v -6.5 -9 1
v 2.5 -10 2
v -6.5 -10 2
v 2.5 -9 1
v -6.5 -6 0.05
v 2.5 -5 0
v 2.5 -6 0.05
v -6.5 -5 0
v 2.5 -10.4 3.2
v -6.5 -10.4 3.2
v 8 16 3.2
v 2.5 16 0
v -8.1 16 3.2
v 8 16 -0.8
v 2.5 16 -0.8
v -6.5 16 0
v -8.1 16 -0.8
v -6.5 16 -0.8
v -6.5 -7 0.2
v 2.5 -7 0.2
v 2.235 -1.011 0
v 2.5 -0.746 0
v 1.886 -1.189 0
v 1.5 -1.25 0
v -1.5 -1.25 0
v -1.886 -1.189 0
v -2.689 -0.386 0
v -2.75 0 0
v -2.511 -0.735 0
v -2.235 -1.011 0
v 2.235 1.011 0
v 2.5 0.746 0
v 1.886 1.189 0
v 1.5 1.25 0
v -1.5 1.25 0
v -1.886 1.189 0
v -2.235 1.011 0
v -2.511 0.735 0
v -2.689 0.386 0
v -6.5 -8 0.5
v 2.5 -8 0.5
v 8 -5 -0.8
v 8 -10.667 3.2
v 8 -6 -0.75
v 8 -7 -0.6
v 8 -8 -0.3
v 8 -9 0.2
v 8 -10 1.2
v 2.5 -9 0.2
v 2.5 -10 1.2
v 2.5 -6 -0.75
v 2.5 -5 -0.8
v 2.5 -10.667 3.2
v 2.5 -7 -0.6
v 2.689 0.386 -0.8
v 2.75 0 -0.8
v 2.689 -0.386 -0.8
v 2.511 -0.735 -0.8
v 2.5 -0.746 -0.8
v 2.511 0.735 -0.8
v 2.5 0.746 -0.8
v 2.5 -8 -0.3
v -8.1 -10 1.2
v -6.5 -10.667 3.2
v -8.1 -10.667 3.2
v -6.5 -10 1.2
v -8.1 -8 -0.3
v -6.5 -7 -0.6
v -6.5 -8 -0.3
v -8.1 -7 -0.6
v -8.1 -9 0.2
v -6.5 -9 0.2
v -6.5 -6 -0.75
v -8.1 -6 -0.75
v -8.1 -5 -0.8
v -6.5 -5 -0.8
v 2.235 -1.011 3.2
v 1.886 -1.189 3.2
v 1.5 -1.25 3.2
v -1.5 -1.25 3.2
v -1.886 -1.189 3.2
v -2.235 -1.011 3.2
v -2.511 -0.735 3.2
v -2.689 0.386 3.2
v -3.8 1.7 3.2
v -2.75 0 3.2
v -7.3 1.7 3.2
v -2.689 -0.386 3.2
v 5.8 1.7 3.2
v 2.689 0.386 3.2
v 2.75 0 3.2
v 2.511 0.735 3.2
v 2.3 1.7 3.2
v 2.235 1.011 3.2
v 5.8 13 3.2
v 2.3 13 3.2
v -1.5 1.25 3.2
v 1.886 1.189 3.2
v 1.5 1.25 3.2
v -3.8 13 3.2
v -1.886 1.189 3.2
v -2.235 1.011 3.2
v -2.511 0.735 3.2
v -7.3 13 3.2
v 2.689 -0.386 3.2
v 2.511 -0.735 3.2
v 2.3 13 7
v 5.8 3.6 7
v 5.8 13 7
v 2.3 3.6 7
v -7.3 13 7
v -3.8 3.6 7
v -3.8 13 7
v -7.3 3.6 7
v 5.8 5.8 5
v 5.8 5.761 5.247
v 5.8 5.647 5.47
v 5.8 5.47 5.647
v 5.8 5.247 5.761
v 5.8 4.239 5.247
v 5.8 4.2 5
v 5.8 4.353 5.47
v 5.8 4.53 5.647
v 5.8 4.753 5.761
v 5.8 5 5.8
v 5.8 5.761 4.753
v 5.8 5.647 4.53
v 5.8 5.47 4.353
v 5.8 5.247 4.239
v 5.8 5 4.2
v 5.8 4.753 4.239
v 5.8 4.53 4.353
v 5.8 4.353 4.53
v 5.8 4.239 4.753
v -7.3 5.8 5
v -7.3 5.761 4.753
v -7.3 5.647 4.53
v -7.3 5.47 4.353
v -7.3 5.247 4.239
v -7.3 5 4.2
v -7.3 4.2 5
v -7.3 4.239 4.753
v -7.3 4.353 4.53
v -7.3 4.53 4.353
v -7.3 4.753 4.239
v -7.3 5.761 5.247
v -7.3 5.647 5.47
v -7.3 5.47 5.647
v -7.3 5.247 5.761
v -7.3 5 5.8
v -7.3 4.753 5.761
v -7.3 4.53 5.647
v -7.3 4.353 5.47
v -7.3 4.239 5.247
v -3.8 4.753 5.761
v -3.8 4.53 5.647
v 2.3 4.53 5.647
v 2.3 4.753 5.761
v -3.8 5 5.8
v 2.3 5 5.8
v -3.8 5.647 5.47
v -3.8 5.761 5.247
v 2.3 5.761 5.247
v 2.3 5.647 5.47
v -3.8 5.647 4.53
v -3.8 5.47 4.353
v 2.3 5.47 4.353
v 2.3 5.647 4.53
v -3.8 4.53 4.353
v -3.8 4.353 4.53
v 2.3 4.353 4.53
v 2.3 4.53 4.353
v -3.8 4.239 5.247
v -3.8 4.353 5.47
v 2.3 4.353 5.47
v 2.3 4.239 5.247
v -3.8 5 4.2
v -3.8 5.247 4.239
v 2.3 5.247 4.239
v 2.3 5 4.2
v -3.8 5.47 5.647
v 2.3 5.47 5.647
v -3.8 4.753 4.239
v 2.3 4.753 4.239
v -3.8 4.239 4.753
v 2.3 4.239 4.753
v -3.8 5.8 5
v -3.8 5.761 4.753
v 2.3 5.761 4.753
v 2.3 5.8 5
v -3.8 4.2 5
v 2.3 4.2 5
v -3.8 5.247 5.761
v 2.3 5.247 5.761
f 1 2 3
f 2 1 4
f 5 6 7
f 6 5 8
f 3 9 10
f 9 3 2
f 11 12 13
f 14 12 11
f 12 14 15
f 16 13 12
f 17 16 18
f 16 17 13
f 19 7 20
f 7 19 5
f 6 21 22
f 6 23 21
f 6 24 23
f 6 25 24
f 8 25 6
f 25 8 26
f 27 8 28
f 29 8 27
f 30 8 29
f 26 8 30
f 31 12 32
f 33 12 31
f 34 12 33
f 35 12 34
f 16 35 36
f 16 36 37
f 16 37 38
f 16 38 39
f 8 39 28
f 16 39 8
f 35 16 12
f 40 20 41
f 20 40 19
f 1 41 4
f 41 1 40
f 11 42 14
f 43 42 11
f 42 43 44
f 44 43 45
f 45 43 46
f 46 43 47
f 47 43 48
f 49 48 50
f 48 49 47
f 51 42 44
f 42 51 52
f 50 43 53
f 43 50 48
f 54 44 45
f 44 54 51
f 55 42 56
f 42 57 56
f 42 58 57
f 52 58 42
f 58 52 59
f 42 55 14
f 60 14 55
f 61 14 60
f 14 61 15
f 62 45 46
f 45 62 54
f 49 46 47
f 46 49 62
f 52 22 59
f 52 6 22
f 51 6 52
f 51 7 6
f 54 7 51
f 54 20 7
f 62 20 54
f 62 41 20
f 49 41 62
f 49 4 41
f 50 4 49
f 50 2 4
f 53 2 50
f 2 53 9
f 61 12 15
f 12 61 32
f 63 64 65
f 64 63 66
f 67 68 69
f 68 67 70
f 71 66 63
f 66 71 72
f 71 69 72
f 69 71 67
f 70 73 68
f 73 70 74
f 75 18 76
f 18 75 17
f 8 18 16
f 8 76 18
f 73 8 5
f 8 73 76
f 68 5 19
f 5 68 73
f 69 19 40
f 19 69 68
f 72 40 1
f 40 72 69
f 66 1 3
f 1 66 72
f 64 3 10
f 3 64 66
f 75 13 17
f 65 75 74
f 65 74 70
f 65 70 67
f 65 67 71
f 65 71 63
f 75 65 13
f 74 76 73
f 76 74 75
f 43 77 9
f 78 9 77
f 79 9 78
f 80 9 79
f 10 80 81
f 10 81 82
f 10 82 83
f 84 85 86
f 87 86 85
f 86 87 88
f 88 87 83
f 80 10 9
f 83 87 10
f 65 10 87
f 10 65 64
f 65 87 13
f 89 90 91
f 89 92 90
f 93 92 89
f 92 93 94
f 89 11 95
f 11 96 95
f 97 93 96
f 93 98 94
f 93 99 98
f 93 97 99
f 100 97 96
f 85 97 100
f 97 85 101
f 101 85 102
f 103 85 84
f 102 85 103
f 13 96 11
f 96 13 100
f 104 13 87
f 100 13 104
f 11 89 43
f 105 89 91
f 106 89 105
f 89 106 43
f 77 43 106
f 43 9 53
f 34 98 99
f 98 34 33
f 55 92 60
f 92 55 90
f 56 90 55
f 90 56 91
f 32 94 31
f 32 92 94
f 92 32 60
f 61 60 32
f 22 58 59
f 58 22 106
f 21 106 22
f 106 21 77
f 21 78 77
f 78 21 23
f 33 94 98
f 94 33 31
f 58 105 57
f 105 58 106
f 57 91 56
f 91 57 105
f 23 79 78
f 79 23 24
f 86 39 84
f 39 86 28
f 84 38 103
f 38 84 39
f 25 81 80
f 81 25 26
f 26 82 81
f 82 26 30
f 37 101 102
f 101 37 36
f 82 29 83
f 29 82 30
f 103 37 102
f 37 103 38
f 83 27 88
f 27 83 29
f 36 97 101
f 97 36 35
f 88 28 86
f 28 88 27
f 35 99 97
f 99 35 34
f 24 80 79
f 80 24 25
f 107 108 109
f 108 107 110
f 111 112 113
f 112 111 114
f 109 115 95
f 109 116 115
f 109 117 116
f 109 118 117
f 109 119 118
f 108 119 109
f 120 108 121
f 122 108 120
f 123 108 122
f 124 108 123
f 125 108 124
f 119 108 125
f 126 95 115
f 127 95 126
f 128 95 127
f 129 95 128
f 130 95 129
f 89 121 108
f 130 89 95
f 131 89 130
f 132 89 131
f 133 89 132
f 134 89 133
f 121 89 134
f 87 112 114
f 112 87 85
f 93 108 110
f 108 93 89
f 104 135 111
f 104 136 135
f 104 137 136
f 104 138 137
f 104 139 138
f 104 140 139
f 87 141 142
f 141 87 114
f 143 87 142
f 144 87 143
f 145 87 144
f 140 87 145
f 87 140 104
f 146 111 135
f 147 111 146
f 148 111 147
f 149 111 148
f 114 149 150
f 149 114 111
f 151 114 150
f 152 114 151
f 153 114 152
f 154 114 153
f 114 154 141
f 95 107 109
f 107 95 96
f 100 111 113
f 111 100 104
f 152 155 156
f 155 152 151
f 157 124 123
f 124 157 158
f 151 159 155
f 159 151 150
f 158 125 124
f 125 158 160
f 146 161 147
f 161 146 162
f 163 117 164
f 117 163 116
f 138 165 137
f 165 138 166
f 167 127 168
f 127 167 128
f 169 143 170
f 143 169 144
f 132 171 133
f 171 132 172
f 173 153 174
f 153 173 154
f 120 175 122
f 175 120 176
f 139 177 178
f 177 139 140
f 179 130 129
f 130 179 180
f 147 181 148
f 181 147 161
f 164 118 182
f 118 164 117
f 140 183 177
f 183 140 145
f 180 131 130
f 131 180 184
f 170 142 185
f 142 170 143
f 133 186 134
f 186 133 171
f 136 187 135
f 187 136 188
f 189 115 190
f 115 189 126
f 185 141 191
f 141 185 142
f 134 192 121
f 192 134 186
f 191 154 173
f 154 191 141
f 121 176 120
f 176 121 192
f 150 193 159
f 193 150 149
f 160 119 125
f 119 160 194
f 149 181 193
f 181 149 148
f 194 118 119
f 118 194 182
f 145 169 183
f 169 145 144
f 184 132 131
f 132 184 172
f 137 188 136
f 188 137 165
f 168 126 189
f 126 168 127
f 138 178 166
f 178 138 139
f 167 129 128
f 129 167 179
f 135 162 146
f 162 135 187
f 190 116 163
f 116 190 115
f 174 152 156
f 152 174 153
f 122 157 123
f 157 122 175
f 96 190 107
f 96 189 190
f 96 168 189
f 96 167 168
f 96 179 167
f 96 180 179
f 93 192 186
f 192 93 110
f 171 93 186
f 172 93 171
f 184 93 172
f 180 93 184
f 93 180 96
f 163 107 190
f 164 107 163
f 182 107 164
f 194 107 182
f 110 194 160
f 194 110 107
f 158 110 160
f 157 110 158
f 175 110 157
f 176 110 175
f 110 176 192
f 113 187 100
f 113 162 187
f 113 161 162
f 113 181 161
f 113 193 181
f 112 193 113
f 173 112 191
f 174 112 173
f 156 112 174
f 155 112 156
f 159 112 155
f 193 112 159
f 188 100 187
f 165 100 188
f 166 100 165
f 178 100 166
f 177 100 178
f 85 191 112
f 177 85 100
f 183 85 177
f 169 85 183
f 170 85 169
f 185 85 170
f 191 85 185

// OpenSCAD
// file: guided_sewing_foot_template.scad
// The diameter of the MATIC rod
matic_rod_diameter = 1.6;

// The height at which the MATIC rod is placed over the plate (the least strict parameter, as the foot is amortized)
matic_rod_dz = 5.0; 

// The Y offset between the MATIC rod and the needle
matic_offset_dy = 5.0;

// The total width of the MATIC handle (including allowance)
matic_handle_width = 6.1; 

// The X offset between the needle and the center of the MATIC handle on Janome machines with a maximum stitch width of 7 mm 
janome_matic_offset_dx = -0.75;

// The width of the transport mechanism in the Janome machines
janome_transport_width = 16.0;

needle_tunnel_length_max = 7.0;
needle_tunnel_margin = 4.0;

foot_base_leftside_width = janome_transport_width / 2;
foot_base_rightside_width_full = janome_transport_width / 2;

guide_min_width = 1.6;
ear_width = 3.5;

foot_base_height = 3.2;

primary_front_length = 5.0;
primary_back_length = 16.0;

short_guide_front_length = 2.0;
short_guide_back_length = 6.0;

ears_piece_width = matic_handle_width + ear_width * 2;
right_ear_edge_x = janome_matic_offset_dx + matic_handle_width / 2 + ear_width;

module reflection(
    mirror_vector = [1, 0, 0]
) {
    union() {
        children();
        mirror(mirror_vector) {
            children();
        }
    }
}

module make_wing(
    width,
    front_length,
    back_length,
) {
    h_max = 5.0;
    dx = 1;
    
    rotate([180, -90, 0])
    linear_extrude(height=width)
    polygon(
        points=[
            [h_max, -back_length],
            [0, -back_length],
            [0.00, front_length + dx * 0],
            [0.05, front_length + dx * 1],
            [0.20, front_length + dx * 2],
            [0.50, front_length + dx * 3],
            [1.00, front_length + dx * 4],
            [2.00, front_length + dx * 5],
            [h_max, front_length + dx * 6]
        ],
        paths=[
            [0, 1, 2, 3, 4, 5, 6, 7, 8],
        ]
    );
}

module top_cutter_global() {
    a = 40;
    h = 20;
    
    translate([-a / 2, -a / 2, foot_base_height])
    cube([a, a, h]);
}

module ears_piece_base_local() {
    back_length = 8.0;
    height = 4.0;
    
    translate([-ears_piece_width/2, 0, 0])
    rotate([180, -90, 0])
    linear_extrude(height=ears_piece_width)
    polygon(
        points=[
            [height / 2, -back_length],
            [-height / 2, -back_length],
            [-height / 2, 3.4],
            [height / 2, 1.4],
        ],
        paths=[
            [0, 1, 2, 3],
        ]
    );
}

module matic_rod_cutter_local() {
    length = 40;
    
    translate([-length / 2, 0, 0])
    rotate([180, -90, 0])
    cylinder(h = length, r = matic_rod_diameter / 2, $fn = 20);
}

module matic_handle_cutter_local() {
    a = matic_handle_width;
    h = 30;
    
    translate([-a / 2, -h / 2, -h / 2])
    cube([a, h, h]);
}

module ears_piece_local() {
    difference() {
        difference() {
            ears_piece_base_local();
            matic_rod_cutter_local();
        }
        matic_handle_cutter_local();
    }
}

module ears_piece_global() {
    translate([
        janome_matic_offset_dx,
        matic_offset_dy,
        matic_rod_dz,
    ])
    ears_piece_local();
}

module make_needle_tunnel_cutter(
    length,
    width,
) {
    height = 10;

    translate([0, 0, -height / 2]) {
        translate([-length / 2, -width / 2, 0])
        cube([length, width, height]);

        reflection([1, 0, 0]) {
            translate([length / 2, 0, 0])
            cylinder(h = height, r = width / 2, $fn = 20);
        }
    }
}

module make_guided_foot(
    // The distance between the needle and the guide
    guide_offset,
    secondary_guide_offset = undef,
    guide_depth = 0.8,
    needle_tunnel_length_limit = needle_tunnel_length_max,
    use_full_width = true,
    use_full_length = false,
) {
    guide_front_length = use_full_length ? primary_front_length : short_guide_front_length;
    guide_back_length = use_full_length ? primary_back_length : short_guide_back_length;

    foot_base_rightside_width_free = use_full_width ? foot_base_rightside_width_full : right_ear_edge_x;
    foot_base_rightside_width = max(guide_offset, foot_base_rightside_width_free);

    // The nominal lenth of the needle tunnel (the maximal usable stich width)
    needle_tunnel_length_safe = (foot_base_rightside_width - needle_tunnel_margin) * 2;
    needle_tunnel_length_effective_max = min(needle_tunnel_length_limit, needle_tunnel_length_max);
    needle_tunnel_length = min(needle_tunnel_length_safe, needle_tunnel_length_effective_max);

    module make_guide(
        offset,
        base_side_width,
    ) {
        width = max(foot_base_rightside_width - offset, guide_min_width);

        translate([offset, 0, -guide_depth])
        make_wing(
            width = width,
            front_length = guide_front_length,
            back_length = guide_back_length
        );
    }

    module foot_base_global() {
        translate([-foot_base_leftside_width, 0, 0])
        make_wing(
            width = foot_base_leftside_width + foot_base_rightside_width,
            front_length = primary_front_length,
            back_length = primary_back_length
        );
    }

    module guide_global() {
        make_guide(
            offset = guide_offset,
            base_side_width = foot_base_rightside_width
        );
    }

    module secondary_guide_global() {
        if (!is_undef(secondary_guide_offset)) {
            scale([-1, 1, 1])
            make_guide(
                offset = secondary_guide_offset,
                base_side_width = foot_base_leftside_width
            );
        }
    }

    module guided_foot_global() {
        difference() {
            difference() {
                union() {
                    foot_base_global();
                    guide_global();
                    secondary_guide_global();
                }

                top_cutter_global();
            };

            needle_tunnel_cutter_global();
        }

        ears_piece_global();
    }

    module needle_tunnel_cutter_global() {
        make_needle_tunnel_cutter(
            length = needle_tunnel_length,
            width = 2.5
        );
    }

    guided_foot_global();
}
// main file
include <guided_sewing_foot_template.scad>;

make_guided_foot(
    guide_offset = 2.5,
    secondary_guide_offset = 6.5,
    needle_tunnel_length_limit = 3.0,
    use_full_length = true
);
